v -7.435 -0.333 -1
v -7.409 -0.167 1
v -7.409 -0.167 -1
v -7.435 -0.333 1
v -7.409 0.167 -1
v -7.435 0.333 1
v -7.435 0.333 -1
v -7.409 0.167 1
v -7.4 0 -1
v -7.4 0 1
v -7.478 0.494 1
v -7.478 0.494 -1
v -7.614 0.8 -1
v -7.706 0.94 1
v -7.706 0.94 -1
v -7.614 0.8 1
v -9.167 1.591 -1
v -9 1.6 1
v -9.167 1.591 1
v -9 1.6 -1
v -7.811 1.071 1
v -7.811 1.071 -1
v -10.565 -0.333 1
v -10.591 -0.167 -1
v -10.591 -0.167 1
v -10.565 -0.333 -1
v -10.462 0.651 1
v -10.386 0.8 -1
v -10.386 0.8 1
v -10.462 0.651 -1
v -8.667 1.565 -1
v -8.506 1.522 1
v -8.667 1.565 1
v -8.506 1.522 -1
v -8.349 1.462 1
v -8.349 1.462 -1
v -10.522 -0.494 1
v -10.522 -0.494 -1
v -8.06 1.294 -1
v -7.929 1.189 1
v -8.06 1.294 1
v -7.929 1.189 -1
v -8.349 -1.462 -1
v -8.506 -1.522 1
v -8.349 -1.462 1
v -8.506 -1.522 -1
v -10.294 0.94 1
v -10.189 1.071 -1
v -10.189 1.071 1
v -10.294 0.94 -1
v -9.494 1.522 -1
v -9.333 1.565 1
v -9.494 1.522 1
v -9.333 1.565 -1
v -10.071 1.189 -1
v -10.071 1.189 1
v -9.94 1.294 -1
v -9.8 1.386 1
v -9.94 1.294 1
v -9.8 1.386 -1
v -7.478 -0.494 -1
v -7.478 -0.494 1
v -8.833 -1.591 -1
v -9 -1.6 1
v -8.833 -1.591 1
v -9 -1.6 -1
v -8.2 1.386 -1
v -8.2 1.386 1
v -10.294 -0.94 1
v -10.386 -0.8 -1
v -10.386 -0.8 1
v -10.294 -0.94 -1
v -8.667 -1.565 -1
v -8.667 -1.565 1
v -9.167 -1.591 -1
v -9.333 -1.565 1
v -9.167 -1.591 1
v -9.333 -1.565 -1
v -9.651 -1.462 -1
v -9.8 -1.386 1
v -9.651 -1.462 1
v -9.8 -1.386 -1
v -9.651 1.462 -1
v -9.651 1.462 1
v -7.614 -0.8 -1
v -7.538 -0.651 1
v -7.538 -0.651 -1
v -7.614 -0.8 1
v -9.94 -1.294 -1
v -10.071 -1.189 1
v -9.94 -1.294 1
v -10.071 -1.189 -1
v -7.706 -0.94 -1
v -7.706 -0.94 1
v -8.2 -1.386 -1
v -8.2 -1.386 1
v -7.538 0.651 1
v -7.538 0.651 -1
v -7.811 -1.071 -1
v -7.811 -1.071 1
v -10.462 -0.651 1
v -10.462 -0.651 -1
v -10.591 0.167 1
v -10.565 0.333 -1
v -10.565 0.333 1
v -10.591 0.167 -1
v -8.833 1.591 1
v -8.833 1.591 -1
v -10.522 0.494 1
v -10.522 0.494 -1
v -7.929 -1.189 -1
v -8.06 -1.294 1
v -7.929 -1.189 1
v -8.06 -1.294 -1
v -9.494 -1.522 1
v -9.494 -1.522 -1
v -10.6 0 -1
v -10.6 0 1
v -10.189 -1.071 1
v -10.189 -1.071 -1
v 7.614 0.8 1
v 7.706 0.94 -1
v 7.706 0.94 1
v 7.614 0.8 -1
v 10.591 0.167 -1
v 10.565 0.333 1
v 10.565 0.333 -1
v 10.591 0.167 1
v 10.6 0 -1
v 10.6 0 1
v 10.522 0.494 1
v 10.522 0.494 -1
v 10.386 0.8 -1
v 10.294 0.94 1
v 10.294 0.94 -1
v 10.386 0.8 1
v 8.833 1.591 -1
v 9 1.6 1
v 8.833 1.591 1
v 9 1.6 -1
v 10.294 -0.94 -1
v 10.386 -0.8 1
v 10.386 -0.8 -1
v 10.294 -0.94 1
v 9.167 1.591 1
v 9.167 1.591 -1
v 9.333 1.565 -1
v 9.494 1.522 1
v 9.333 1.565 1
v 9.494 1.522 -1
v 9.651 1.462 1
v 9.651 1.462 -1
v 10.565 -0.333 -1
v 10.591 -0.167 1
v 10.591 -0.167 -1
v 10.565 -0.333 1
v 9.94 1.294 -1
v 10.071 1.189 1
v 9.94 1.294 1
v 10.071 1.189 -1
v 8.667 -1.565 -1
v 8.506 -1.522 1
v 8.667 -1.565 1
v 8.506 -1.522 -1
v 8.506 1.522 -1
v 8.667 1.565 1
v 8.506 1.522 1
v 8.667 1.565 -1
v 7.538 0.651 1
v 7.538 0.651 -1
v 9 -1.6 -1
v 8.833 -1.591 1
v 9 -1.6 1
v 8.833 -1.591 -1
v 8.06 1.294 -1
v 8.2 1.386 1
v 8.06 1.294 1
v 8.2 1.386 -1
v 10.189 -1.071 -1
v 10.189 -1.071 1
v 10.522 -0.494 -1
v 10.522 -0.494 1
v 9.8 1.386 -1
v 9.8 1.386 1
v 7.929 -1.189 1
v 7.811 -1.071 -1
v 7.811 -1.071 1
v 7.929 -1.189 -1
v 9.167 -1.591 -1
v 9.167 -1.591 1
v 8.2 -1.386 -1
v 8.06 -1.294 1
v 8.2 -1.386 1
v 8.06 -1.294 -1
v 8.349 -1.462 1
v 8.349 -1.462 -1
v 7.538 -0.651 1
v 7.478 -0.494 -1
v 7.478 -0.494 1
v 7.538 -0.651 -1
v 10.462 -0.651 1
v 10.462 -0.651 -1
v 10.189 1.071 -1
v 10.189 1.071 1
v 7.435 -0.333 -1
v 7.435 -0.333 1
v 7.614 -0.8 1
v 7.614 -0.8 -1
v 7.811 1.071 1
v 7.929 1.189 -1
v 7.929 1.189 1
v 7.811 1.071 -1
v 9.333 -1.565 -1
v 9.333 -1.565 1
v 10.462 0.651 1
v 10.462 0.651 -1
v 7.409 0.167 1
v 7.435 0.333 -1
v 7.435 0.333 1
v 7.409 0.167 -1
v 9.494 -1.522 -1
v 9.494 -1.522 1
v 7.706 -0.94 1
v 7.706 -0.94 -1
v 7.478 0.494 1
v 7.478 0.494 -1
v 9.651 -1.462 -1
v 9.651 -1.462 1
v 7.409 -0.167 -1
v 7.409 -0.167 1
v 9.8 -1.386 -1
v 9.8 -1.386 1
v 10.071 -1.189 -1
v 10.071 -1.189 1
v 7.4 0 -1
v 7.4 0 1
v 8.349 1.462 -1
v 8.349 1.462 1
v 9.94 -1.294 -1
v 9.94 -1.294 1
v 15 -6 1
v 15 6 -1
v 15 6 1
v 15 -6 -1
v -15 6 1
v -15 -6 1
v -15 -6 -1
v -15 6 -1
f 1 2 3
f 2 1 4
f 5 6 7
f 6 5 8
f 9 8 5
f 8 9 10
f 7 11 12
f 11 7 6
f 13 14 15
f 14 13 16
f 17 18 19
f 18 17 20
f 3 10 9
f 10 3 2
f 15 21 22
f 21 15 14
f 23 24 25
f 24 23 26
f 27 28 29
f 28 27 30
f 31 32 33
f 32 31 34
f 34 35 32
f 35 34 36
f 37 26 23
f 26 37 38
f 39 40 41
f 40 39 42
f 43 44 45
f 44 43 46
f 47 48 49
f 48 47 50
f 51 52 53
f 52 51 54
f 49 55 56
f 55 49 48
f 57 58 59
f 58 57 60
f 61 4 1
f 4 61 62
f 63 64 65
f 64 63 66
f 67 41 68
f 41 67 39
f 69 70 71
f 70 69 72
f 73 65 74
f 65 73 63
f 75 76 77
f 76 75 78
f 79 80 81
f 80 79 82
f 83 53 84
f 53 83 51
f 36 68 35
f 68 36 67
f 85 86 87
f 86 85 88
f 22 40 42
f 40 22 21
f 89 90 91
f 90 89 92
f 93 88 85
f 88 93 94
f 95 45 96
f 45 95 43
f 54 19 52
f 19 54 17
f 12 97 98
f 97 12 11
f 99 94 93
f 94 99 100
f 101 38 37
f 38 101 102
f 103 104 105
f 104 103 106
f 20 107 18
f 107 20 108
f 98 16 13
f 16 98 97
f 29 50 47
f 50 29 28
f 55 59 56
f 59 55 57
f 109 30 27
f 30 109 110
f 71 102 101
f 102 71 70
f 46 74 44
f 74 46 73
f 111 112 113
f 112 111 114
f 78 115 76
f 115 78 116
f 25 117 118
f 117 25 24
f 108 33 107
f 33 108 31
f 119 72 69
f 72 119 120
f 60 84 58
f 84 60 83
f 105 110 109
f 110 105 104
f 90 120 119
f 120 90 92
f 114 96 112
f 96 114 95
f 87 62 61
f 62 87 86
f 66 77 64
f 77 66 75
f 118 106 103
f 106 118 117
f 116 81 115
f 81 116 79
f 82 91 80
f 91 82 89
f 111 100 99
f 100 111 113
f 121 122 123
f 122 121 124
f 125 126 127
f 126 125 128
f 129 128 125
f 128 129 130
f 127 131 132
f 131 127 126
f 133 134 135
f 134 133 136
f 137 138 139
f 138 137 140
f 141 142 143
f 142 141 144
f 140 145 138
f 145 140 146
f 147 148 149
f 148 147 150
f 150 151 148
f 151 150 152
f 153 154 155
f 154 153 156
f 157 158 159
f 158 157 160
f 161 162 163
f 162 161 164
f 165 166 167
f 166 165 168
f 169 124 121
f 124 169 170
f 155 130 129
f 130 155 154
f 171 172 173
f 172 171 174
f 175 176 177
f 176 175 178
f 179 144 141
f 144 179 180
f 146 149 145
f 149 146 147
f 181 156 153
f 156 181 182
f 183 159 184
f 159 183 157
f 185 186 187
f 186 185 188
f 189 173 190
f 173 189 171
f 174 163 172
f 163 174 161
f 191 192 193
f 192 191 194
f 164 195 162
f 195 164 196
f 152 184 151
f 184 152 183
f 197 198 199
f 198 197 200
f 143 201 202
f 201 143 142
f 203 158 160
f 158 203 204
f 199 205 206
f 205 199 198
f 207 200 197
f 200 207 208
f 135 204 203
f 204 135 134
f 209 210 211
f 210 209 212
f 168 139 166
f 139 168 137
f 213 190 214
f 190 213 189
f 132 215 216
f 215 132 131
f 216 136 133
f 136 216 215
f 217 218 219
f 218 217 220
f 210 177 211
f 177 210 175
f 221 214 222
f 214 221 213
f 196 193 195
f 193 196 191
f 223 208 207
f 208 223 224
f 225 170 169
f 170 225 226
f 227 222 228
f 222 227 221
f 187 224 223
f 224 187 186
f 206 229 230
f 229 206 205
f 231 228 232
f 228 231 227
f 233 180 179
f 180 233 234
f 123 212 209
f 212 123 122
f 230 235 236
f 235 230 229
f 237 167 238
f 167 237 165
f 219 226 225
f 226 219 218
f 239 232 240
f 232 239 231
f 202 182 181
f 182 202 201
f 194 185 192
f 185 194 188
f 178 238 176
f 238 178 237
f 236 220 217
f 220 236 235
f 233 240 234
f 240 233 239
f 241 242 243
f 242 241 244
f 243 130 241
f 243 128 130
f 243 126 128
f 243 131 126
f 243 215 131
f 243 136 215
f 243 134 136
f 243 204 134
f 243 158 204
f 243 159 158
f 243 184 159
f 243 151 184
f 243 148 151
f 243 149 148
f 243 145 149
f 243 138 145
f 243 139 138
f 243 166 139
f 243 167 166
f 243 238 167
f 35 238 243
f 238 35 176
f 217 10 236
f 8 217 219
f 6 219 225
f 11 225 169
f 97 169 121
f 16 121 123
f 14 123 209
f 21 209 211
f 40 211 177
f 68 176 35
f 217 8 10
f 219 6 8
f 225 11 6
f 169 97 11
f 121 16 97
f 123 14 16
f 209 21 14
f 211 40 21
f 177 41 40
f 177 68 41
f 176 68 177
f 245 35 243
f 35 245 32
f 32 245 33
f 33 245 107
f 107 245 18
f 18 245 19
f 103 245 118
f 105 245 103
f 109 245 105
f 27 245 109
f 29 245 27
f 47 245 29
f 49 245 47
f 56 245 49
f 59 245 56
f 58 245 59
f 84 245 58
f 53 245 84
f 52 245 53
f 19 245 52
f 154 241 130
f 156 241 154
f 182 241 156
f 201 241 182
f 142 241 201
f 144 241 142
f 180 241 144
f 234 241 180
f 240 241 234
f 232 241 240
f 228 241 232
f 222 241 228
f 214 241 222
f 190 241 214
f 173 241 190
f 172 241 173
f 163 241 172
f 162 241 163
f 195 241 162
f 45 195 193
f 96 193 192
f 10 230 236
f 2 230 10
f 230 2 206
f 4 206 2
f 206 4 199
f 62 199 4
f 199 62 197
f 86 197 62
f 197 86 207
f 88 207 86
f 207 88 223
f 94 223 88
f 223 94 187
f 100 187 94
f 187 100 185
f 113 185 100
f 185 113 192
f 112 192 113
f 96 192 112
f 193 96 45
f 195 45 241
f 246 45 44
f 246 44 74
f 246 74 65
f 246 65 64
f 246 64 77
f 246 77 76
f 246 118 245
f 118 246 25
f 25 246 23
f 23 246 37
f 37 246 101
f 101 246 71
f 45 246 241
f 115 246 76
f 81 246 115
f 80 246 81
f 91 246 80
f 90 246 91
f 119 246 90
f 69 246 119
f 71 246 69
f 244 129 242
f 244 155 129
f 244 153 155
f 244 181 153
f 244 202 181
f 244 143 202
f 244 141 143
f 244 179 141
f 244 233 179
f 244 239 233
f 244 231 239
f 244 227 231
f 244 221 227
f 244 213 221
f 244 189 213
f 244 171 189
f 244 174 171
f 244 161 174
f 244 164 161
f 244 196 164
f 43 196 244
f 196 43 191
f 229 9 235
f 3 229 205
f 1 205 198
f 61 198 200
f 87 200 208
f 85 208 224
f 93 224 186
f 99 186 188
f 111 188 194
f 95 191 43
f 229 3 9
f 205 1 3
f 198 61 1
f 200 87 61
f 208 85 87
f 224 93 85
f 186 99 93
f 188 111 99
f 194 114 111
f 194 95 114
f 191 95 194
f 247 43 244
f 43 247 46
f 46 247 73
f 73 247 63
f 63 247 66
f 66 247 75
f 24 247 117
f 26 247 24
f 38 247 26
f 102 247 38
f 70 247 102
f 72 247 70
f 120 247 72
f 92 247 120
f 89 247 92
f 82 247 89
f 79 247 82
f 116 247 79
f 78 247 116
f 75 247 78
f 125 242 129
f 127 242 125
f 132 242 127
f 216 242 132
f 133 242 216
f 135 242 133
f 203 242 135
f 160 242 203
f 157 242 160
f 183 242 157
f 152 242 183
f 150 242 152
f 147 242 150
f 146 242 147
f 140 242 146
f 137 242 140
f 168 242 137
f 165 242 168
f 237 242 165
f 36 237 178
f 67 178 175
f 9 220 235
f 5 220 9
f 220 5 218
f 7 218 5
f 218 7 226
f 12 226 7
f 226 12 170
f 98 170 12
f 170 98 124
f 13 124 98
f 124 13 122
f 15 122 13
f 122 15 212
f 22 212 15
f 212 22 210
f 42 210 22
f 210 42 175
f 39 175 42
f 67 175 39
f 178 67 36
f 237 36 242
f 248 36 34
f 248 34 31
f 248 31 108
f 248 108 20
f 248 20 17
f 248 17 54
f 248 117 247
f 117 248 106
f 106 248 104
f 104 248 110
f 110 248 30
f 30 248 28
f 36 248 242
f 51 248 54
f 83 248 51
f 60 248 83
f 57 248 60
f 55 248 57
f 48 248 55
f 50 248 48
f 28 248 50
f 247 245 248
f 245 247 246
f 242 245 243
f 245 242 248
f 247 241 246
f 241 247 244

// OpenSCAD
// Engraving-ready nameplate.
$fn = 60;
eps = 0.02;
length = 30;
width = 12;
thickness = 2;
difference() { cube([length,width,thickness],center=true); for(x=[-length/2+6,length/2-6]) translate([x,0,-thickness/2-eps]) cylinder(d=3.2,h=thickness+2*eps); }
